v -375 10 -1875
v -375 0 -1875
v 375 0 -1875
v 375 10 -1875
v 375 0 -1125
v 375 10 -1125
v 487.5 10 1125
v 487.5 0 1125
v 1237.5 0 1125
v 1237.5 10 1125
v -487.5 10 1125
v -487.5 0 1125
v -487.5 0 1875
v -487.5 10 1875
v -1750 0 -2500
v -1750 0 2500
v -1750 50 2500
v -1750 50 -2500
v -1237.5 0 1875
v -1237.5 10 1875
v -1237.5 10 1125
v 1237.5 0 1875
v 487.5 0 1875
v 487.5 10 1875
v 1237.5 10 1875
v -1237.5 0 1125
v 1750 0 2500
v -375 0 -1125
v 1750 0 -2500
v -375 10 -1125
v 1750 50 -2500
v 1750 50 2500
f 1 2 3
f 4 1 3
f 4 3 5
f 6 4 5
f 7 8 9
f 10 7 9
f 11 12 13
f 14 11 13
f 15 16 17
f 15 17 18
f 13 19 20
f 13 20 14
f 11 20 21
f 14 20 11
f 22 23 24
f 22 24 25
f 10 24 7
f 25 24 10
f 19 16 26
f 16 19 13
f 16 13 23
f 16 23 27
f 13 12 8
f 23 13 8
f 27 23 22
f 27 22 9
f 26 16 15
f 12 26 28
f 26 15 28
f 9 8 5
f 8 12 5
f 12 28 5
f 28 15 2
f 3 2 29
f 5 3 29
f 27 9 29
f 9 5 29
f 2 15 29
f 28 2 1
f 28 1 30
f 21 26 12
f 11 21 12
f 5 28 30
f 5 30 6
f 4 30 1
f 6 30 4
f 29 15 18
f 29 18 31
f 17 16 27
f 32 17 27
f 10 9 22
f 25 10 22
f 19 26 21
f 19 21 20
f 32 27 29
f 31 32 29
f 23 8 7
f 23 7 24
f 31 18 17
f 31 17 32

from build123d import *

# Parameters (mm, degrees)
SKETCH1_W           = 3500
SKETCH1_H           = 5000
BOSS_EXTRUDE1_DEPTH = 50
SKETCH2_W           = 750
SKETCH2_H           = 750
CUT_EXTRUDE1_DEPTH  = 10
SKETCH3_W           = 750
SKETCH3_H           = 750
CUT_EXTRUDE2_DEPTH  = 10


with BuildPart() as part:
    # Sketch1 → Boss-Extrude1 (new body)
    with BuildSketch(Plane(origin=(0, 0, 0), x_dir=(1, 0, 0), z_dir=(0, 1, 0))):
        Rectangle(SKETCH1_W, SKETCH1_H)
    extrude(amount=BOSS_EXTRUDE1_DEPTH)

    # Sketch2 → Cut-Extrude1 (cut)
    with BuildSketch(Plane.XZ):
        with Locations((-862.5, 1500)):
            Rectangle(SKETCH2_W, SKETCH2_H)
        with Locations((862.5, 1500)):
            Rectangle(SKETCH2_W, SKETCH2_H)
    extrude(amount=-CUT_EXTRUDE1_DEPTH, mode=Mode.SUBTRACT)

    # Sketch3 → Cut-Extrude2 (cut)
    with BuildSketch(Plane.XZ):
        with Locations((0, -1500)):
            Rectangle(SKETCH3_W, SKETCH3_H)
    extrude(amount=-CUT_EXTRUDE2_DEPTH, mode=Mode.SUBTRACT)


solid = part.part
